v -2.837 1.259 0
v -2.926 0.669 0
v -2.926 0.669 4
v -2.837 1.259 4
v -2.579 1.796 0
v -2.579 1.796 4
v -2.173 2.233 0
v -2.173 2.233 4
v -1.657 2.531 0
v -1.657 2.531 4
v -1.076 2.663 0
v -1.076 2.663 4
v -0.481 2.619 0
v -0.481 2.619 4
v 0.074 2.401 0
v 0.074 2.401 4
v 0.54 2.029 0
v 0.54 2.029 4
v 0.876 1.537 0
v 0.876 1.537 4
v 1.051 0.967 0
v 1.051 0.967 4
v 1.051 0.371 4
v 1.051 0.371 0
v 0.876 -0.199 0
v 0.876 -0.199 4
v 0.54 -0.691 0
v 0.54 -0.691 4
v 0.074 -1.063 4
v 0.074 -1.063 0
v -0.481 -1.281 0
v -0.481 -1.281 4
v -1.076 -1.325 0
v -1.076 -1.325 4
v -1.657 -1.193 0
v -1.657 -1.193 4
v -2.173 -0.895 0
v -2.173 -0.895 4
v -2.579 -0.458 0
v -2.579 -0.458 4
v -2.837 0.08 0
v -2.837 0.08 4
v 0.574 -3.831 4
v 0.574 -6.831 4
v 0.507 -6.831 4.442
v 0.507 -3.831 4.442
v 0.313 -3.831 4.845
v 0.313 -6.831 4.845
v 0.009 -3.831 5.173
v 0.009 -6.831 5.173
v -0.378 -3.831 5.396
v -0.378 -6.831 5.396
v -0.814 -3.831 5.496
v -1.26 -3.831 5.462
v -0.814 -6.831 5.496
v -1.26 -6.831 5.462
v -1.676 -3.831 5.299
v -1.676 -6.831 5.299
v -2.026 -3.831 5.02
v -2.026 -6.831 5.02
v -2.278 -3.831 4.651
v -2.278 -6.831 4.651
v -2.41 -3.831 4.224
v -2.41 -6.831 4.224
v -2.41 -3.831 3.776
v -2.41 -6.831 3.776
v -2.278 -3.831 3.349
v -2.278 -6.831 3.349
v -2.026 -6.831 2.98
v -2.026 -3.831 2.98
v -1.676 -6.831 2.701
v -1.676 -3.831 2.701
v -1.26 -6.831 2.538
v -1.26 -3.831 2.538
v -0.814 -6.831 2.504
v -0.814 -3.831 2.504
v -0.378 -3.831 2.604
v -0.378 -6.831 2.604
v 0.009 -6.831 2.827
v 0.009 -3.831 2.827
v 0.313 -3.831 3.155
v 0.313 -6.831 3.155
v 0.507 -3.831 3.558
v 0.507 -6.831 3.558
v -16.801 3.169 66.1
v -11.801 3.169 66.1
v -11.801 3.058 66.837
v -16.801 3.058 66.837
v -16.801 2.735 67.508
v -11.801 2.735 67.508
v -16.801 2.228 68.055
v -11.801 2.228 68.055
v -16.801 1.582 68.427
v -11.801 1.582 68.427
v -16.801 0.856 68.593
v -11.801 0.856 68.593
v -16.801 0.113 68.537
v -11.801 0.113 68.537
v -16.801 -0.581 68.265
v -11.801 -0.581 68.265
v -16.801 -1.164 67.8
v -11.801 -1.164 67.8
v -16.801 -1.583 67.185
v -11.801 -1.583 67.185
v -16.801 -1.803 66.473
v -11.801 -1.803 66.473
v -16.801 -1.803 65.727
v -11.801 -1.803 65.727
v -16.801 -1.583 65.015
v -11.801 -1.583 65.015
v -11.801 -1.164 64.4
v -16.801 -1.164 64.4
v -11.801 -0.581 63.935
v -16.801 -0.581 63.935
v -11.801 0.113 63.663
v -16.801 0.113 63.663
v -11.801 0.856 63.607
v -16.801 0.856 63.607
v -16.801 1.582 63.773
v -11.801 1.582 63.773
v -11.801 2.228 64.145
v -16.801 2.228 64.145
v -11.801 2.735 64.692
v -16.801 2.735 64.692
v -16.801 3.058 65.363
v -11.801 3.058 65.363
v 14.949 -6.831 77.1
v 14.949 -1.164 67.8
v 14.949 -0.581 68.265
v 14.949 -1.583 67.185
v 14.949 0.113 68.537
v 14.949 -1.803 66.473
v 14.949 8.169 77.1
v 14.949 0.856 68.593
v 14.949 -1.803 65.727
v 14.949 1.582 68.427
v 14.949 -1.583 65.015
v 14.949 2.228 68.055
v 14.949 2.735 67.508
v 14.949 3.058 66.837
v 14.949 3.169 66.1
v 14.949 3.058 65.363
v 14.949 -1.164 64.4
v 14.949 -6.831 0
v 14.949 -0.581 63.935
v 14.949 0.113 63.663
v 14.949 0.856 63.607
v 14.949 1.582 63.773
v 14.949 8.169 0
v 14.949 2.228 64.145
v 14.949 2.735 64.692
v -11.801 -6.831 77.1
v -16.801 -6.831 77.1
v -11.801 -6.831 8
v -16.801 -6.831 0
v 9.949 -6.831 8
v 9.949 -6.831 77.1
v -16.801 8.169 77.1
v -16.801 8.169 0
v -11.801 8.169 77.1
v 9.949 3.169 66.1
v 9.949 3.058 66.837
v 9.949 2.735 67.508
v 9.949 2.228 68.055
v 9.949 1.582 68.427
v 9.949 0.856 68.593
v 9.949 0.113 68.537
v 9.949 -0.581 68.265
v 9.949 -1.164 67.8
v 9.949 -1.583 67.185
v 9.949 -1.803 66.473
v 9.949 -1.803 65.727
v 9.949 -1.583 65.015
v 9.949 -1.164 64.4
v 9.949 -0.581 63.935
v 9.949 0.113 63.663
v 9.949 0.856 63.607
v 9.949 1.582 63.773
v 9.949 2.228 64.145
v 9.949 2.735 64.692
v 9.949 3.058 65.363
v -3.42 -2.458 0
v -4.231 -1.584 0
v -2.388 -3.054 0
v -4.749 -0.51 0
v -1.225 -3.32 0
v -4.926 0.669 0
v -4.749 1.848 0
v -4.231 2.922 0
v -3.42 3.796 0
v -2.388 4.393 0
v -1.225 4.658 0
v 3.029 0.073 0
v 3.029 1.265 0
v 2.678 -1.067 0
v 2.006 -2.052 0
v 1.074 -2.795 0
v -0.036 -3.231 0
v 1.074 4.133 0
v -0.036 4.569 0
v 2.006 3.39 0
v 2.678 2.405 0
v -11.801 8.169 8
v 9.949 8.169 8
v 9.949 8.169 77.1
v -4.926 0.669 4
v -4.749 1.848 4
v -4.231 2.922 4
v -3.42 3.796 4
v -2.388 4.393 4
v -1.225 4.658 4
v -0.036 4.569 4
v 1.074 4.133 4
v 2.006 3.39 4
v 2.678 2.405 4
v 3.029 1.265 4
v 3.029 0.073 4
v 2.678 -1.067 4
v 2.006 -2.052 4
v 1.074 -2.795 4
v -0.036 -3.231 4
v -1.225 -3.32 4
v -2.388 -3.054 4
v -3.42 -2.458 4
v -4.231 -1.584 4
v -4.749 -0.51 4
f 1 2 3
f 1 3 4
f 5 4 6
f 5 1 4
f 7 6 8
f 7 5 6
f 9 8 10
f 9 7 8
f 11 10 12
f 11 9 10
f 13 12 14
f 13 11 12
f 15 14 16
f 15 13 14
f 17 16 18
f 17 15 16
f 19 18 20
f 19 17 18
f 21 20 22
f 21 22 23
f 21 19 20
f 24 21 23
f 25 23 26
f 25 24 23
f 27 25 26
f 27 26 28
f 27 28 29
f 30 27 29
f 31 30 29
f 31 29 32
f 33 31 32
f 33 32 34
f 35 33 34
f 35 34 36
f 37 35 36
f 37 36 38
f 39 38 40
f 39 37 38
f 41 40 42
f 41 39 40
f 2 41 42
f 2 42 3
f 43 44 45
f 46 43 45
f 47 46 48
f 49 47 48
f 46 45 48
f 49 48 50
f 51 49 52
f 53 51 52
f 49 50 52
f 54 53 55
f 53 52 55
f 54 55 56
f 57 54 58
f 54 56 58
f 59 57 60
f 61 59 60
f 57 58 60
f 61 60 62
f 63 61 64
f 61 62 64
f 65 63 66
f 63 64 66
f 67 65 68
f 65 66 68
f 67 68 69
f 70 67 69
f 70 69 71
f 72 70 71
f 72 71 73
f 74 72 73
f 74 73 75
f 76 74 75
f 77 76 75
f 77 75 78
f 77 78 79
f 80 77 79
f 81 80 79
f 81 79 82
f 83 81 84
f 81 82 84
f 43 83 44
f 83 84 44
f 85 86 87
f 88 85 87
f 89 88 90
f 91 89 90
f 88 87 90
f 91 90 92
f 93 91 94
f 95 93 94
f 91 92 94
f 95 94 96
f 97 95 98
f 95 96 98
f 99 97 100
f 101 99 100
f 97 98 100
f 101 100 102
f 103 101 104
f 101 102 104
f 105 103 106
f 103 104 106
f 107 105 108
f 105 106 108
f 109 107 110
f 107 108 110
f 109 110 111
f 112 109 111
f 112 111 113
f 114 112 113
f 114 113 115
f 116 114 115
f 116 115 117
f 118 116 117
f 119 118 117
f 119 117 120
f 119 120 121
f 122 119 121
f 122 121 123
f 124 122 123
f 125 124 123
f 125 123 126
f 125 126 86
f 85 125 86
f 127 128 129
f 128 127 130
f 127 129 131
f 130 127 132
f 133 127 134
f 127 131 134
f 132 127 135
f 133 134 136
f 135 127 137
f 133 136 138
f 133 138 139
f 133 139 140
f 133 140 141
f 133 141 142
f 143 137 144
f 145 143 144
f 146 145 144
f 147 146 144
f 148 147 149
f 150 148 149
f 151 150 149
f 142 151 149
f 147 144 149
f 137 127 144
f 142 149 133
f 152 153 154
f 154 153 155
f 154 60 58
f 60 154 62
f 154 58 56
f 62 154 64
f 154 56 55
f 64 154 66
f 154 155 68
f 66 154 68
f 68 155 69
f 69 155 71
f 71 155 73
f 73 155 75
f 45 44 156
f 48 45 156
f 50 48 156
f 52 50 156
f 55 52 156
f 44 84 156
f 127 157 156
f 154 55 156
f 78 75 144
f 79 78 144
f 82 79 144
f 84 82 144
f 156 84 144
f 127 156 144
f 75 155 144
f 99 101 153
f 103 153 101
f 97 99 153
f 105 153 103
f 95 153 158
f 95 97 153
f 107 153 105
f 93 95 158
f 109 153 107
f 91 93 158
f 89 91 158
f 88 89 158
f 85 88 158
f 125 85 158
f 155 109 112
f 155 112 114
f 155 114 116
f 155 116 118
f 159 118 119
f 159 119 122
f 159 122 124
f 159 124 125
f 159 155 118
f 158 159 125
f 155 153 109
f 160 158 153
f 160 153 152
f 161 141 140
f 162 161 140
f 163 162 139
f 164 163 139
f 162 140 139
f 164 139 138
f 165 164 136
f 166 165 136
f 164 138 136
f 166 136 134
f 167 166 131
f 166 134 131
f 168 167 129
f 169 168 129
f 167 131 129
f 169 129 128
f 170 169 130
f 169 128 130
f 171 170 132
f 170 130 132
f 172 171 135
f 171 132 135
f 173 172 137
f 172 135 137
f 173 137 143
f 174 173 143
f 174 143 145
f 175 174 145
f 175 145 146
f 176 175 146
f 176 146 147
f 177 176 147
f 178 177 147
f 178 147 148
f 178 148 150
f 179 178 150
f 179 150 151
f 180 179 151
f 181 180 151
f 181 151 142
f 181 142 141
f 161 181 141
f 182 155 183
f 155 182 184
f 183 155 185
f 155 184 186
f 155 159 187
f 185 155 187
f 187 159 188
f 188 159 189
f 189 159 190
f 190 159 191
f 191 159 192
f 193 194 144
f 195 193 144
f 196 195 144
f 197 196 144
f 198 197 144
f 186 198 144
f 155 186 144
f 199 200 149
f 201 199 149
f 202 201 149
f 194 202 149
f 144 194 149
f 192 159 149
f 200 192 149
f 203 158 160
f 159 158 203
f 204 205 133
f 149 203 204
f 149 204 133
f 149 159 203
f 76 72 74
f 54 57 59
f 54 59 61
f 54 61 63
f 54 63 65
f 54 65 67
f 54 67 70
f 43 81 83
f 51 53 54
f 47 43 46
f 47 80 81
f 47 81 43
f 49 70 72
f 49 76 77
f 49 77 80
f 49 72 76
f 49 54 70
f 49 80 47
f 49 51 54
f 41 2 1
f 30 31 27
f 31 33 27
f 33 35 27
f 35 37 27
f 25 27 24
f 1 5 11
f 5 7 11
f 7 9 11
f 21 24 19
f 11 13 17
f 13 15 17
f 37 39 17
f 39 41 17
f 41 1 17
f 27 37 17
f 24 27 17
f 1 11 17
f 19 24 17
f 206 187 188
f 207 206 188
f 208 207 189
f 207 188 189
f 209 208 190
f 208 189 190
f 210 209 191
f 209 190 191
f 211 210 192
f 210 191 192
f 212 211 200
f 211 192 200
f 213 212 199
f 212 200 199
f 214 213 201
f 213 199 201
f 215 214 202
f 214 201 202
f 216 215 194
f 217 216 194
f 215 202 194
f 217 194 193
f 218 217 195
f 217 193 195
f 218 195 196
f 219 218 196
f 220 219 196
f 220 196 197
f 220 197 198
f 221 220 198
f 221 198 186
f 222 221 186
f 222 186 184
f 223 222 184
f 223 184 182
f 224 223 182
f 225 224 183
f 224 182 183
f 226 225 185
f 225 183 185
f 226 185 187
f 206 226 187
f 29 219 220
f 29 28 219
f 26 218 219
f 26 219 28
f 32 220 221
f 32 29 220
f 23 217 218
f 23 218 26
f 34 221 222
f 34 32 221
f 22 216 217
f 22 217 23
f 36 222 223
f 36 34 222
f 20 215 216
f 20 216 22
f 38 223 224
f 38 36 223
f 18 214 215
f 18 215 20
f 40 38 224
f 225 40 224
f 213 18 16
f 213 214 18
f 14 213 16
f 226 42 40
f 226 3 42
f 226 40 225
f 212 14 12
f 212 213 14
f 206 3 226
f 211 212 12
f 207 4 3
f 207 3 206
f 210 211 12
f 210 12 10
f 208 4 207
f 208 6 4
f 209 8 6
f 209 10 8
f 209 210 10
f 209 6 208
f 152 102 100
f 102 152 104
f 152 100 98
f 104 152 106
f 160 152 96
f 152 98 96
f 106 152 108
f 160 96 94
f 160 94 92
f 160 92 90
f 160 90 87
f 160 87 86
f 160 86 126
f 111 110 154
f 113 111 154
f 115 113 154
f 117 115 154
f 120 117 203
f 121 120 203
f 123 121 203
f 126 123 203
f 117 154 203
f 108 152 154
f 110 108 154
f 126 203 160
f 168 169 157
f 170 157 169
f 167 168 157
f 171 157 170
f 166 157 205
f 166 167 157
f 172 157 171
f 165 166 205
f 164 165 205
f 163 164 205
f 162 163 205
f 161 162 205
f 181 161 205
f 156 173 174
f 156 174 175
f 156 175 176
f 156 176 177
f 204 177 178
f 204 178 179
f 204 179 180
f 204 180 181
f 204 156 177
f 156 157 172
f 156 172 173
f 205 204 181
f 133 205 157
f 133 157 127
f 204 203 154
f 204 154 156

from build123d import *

# Parameters (mm, degrees)
SKETCH1_W           = 31.75
SKETCH1_H           = 15
BOSS_EXTRUDE1_DEPTH = 8
SKETCH2_W           = 5
SKETCH2_H           = 15
BOSS_EXTRUDE2_DEPTH = 69.1
SKETCH3_R           = 2.5
CUT_EXTRUDE1_DEPTH  = 69.1
SKETCH4_R           = 4
SKETCH4_R_2         = 2
CUT_EXTRUDE3_DEPTH  = 4
SKETCH5_R           = 1.5
CUT_EXTRUDE4_DEPTH  = 3


with BuildPart() as part:
    # Sketch1 → Boss-Extrude1 (new body)
    with BuildSketch(Plane.XY):
        with Locations((-0.926352113, 0.669031185)):
            Rectangle(SKETCH1_W, SKETCH1_H)
    extrude(amount=BOSS_EXTRUDE1_DEPTH)

    # Sketch2 → Boss-Extrude2 (add)
    with BuildSketch(Plane.XY.offset(8)):
        with Locations((-14.301352113, 0.669031185)):
            Rectangle(SKETCH2_W, SKETCH2_H)
        with Locations((12.448647887, 0.669031185)):
            Rectangle(SKETCH2_W, SKETCH2_H)
    extrude(amount=BOSS_EXTRUDE2_DEPTH)

    # Sketch3 → Cut-Extrude1 (cut)
    with BuildSketch(Plane(origin=(14.948647887, 0, 0), x_dir=(0, 0, -1), z_dir=(1, 0, 0))):
        with Locations(Location((-66.1, 0.669031185, 0), (0, 0, 90))):
            Circle(SKETCH3_R)
    extrude(amount=-CUT_EXTRUDE1_DEPTH, mode=Mode.SUBTRACT)

    # Sketch4 → Cut-Extrude3 (cut)
    with BuildSketch(Plane(origin=(0, 0, 0), x_dir=(-1, 0, 0), z_dir=(0, 0, -1))):
        with Locations((0.926352113, 0.669031185)):
            Circle(SKETCH4_R)
        with Locations((0.926352113, 0.669031185)):
            Circle(SKETCH4_R_2, mode=Mode.SUBTRACT)
    extrude(amount=-CUT_EXTRUDE3_DEPTH, mode=Mode.SUBTRACT)

    # Sketch5 → Cut-Extrude4 (cut)
    with BuildSketch(Plane.XZ.offset(6.830968815)):
        with Locations((-0.926352113, 4)):
            Circle(SKETCH5_R)
    extrude(amount=-CUT_EXTRUDE4_DEPTH, mode=Mode.SUBTRACT)


solid = part.part
